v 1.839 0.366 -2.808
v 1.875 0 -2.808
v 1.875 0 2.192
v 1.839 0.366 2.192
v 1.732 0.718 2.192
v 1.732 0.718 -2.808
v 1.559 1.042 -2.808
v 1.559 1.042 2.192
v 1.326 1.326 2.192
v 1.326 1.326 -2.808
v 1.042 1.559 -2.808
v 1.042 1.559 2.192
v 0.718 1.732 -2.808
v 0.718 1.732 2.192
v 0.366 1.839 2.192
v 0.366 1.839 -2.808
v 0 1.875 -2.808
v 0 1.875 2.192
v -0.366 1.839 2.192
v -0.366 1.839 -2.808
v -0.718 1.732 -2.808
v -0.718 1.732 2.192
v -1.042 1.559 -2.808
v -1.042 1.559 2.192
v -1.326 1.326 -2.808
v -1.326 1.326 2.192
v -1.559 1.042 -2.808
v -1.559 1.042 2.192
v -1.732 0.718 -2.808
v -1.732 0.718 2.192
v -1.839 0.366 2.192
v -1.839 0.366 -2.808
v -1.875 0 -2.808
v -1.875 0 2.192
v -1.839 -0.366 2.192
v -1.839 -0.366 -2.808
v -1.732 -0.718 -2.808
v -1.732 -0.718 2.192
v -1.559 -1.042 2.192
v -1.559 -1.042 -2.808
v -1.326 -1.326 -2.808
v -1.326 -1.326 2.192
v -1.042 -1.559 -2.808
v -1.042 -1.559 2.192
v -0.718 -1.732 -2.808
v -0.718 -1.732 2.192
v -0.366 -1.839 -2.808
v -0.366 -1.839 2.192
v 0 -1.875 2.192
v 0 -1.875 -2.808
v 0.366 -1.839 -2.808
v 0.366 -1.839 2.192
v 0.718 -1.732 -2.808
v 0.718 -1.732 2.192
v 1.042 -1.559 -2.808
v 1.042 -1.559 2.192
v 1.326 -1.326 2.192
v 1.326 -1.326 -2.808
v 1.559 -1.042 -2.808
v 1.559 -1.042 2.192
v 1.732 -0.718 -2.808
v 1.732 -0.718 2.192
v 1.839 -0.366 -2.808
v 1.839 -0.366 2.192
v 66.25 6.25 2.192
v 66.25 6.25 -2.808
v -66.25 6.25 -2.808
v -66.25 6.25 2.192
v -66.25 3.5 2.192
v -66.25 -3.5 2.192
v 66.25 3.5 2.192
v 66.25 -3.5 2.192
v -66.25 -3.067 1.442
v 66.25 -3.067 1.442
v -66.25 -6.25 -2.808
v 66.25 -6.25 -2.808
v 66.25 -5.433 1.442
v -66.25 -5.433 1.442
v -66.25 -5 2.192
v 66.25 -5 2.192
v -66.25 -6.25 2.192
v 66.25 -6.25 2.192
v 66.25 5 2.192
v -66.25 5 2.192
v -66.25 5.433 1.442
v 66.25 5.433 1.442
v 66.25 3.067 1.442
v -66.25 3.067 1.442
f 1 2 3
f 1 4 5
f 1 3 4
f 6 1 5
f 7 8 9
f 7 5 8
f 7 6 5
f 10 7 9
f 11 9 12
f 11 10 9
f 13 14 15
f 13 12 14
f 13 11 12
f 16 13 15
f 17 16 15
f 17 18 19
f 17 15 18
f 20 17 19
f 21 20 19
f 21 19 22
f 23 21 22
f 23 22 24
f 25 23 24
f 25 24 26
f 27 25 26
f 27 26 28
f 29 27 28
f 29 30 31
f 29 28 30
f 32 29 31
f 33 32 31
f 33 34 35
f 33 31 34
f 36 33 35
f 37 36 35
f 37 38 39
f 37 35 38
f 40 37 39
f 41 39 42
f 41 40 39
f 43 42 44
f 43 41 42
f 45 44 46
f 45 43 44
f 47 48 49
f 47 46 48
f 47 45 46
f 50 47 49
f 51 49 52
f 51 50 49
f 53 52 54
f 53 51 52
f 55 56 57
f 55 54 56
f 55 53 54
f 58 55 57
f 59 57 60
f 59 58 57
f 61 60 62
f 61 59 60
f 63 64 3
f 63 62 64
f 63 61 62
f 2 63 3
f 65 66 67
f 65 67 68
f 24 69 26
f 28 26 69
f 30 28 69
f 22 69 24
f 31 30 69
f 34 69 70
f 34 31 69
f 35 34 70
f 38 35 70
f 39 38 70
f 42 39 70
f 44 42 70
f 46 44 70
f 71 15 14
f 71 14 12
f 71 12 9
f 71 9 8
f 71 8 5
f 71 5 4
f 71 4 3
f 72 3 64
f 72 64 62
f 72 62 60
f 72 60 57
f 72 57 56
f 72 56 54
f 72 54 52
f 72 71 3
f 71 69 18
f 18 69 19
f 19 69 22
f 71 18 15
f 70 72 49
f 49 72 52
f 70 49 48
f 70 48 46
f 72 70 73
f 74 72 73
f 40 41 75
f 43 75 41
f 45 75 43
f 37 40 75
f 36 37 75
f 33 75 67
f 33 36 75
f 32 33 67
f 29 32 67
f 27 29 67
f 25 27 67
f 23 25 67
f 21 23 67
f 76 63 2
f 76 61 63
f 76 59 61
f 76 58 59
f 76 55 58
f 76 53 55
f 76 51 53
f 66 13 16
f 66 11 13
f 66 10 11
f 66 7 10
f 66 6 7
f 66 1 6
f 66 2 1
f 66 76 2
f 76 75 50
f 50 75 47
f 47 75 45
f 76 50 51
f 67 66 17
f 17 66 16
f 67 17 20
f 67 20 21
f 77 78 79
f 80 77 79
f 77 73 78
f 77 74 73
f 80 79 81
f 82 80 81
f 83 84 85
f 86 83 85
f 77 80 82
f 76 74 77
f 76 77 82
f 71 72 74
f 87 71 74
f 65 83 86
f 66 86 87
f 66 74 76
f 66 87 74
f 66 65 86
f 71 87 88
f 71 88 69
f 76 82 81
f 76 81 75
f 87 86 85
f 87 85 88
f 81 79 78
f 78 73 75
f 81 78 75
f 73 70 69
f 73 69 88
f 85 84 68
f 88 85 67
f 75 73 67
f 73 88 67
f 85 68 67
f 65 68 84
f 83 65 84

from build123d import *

# Parameters (mm, degrees)
BOSS_EXTRUDE1_DEPTH     = 265
CUT_EXTRUDE2_DEPTH      = 267.364412037
CUT_EXTRUDE2_DEPTH_BACK = 267.364412037
SKETCH3_R               = 7.5
SCALE1_SCALE            = 0.25


with BuildPart() as part:
    # Sketch2 → Boss-Extrude1 (new, symmetric)
    with BuildSketch(Plane(origin=(0, 0, 0), x_dir=(0, 0, -1), z_dir=(1, 0, 0))):
        Polygon((-10, -20), (-10, -25), (10, -25), (10, 25), (-10, 25), (-10, 20), (-7, 21.732050808), (-7, 12.267949192), (-10, 14), (-10, -14), (-7, -12.267949192), (-7, -21.732050808), align=None)
    extrude(amount=BOSS_EXTRUDE1_DEPTH, both=True)

    # Sketch3 → Cut-Extrude2 (cut, two sides: drawn at the far end of the back side and taken through both)
    with BuildSketch(Plane.XY.offset(-CUT_EXTRUDE2_DEPTH_BACK)):
        Circle(SKETCH3_R)
    extrude(amount=CUT_EXTRUDE2_DEPTH + CUT_EXTRUDE2_DEPTH_BACK, mode=Mode.SUBTRACT)


with BuildPart() as part_1:
    # Scale1: scaled about (0, 0, -0.410943417)
    add(part.part.scale(SCALE1_SCALE).moved(Location((0, 0, -0.308207563))))


solid = part_1.part
